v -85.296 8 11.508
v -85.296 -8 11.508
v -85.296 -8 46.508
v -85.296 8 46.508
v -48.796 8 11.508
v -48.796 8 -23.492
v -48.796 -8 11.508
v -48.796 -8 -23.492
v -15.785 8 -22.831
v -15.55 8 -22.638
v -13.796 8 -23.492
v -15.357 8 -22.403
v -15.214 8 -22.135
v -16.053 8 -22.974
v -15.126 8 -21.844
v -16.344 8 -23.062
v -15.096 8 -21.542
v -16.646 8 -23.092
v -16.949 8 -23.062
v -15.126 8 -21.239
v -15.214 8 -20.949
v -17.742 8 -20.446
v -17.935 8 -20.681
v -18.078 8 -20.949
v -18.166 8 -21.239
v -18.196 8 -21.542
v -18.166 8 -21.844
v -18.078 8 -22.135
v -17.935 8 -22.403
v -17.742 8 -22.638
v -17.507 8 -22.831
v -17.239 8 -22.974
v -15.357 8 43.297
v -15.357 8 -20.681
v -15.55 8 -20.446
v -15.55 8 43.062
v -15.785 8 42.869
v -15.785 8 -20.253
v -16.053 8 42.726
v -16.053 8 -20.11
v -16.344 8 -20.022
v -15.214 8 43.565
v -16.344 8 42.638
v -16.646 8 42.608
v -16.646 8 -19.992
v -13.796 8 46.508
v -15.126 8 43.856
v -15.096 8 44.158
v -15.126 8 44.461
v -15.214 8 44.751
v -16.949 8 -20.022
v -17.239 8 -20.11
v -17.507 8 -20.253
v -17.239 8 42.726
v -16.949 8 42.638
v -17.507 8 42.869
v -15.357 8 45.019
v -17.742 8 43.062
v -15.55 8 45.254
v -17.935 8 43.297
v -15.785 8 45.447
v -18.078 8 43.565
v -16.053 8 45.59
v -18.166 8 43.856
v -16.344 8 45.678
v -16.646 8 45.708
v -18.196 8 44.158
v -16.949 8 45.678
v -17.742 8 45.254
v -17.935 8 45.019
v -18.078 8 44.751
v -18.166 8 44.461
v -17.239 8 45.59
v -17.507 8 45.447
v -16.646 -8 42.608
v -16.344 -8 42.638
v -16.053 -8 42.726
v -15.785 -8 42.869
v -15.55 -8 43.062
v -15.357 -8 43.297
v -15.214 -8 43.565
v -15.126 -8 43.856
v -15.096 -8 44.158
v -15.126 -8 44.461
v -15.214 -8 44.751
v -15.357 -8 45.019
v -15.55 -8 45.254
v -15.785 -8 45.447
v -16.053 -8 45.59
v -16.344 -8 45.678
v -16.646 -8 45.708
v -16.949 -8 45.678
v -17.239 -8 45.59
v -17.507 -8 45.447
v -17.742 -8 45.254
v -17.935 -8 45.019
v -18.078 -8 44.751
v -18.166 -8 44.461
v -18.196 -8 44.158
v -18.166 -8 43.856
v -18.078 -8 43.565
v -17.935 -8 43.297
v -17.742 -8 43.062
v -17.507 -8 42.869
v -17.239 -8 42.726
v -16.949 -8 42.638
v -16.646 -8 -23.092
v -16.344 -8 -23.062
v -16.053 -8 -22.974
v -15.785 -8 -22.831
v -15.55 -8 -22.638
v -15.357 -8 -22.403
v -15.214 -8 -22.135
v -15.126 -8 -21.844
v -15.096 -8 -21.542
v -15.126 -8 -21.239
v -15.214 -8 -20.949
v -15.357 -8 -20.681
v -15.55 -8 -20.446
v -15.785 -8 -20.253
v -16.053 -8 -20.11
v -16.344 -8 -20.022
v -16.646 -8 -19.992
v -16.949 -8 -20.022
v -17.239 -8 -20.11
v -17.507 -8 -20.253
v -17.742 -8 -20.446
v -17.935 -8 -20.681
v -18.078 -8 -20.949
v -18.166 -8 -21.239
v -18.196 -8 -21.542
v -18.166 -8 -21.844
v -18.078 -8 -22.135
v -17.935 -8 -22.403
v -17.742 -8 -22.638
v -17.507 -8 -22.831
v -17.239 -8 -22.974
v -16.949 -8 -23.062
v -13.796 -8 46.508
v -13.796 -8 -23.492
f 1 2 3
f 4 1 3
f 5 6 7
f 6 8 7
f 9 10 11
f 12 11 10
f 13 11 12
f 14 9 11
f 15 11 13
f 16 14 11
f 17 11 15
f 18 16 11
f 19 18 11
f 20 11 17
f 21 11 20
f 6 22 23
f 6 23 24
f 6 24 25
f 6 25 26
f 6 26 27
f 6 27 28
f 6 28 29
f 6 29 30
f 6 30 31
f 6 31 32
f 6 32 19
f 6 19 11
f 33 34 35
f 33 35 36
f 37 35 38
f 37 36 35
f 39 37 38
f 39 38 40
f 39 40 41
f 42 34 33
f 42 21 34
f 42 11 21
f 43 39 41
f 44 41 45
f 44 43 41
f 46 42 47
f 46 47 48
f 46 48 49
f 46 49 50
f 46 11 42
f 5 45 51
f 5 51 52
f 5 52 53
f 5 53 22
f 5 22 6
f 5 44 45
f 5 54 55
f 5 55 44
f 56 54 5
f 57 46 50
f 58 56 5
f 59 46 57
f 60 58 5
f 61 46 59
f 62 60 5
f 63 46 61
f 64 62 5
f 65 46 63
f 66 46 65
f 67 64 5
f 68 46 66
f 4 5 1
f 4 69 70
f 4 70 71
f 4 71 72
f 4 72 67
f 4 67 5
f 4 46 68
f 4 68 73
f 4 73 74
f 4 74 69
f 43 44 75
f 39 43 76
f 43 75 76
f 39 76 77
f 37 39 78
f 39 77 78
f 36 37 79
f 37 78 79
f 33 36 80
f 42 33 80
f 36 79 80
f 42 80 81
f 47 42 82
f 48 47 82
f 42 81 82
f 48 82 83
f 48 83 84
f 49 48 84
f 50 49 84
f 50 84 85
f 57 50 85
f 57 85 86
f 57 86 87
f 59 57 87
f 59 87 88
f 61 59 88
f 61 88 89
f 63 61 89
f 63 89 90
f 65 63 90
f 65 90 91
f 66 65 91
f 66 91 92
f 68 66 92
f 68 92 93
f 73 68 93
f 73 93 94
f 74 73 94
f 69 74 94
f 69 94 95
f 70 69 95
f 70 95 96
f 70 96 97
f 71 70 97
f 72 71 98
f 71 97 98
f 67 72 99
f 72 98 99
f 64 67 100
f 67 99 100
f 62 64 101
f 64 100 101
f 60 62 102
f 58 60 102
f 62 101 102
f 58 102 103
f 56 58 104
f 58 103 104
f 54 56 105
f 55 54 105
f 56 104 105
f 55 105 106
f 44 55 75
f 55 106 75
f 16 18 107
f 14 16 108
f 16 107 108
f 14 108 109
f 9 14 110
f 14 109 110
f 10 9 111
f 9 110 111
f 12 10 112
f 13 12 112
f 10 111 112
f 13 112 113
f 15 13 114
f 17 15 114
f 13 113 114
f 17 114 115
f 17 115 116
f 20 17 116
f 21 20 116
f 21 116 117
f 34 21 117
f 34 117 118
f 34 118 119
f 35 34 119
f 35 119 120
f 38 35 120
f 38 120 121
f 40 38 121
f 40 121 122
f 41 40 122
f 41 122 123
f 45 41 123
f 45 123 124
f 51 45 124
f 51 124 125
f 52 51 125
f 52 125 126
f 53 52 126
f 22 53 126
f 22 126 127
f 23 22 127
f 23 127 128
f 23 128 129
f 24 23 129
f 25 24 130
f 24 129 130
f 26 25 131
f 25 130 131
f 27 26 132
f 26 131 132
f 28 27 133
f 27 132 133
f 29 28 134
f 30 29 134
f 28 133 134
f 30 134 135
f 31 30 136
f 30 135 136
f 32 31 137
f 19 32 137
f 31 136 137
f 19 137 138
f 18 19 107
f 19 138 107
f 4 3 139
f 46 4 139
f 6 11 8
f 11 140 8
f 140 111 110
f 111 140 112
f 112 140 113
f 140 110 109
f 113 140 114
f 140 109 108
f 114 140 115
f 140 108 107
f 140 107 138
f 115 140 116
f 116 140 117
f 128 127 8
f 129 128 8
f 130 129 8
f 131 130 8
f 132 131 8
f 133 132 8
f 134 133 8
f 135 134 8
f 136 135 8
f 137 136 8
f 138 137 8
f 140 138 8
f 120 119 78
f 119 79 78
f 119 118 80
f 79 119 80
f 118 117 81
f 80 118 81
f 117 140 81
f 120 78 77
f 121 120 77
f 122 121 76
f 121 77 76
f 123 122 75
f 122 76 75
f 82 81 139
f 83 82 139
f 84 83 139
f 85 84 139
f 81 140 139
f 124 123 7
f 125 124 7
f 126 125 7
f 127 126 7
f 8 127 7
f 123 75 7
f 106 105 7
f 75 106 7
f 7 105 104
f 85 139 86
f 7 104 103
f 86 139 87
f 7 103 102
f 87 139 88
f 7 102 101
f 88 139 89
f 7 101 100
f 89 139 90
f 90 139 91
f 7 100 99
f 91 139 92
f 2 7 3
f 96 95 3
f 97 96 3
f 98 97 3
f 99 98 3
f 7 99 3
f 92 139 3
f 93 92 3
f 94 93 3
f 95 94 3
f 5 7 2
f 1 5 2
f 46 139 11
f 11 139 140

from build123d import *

# Parameters (mm, degrees)
BOSS_EXTRUDE1_DEPTH = 8
MOVE_FACE1_BY       = 19
SKETCH3_R           = 1.55
CUT_EXTRUDE1_DEPTH  = 99.460415825


with BuildPart() as part:
    # Sketch2 → Boss-Extrude1 (new, symmetric)
    with BuildSketch(Plane.XZ):
        Polygon((-13.796187154, 46.508213699), (-13.796187154, -23.491786301), (-48.796187154, -23.491786301), (-48.796187154, 11.508213699), (-104.296187154, 11.508213699), (-104.296187154, 46.508213699), align=None)
    extrude(amount=BOSS_EXTRUDE1_DEPTH, both=True)

    # Move Face1: a face moved inward by 19.0
    extrude(part.faces().sort_by_distance((-104.296187154, 0, 29.008213699))[0], amount=MOVE_FACE1_BY, dir=(1, 0, 0), mode=Mode.SUBTRACT)

    # Sketch3 → Cut-Extrude1 (cut, through all)
    with BuildSketch(Plane.XZ.offset(8)):
        with Locations(Location((-16.646187154, 44.158213699, 0), (0, 0, 270))):
            Circle(SKETCH3_R)
        with Locations(Location((-16.646187154, -21.541786301, 0), (0, 0, 270))):
            Circle(SKETCH3_R)
    extrude(amount=-CUT_EXTRUDE1_DEPTH, mode=Mode.SUBTRACT)


solid = part.part
